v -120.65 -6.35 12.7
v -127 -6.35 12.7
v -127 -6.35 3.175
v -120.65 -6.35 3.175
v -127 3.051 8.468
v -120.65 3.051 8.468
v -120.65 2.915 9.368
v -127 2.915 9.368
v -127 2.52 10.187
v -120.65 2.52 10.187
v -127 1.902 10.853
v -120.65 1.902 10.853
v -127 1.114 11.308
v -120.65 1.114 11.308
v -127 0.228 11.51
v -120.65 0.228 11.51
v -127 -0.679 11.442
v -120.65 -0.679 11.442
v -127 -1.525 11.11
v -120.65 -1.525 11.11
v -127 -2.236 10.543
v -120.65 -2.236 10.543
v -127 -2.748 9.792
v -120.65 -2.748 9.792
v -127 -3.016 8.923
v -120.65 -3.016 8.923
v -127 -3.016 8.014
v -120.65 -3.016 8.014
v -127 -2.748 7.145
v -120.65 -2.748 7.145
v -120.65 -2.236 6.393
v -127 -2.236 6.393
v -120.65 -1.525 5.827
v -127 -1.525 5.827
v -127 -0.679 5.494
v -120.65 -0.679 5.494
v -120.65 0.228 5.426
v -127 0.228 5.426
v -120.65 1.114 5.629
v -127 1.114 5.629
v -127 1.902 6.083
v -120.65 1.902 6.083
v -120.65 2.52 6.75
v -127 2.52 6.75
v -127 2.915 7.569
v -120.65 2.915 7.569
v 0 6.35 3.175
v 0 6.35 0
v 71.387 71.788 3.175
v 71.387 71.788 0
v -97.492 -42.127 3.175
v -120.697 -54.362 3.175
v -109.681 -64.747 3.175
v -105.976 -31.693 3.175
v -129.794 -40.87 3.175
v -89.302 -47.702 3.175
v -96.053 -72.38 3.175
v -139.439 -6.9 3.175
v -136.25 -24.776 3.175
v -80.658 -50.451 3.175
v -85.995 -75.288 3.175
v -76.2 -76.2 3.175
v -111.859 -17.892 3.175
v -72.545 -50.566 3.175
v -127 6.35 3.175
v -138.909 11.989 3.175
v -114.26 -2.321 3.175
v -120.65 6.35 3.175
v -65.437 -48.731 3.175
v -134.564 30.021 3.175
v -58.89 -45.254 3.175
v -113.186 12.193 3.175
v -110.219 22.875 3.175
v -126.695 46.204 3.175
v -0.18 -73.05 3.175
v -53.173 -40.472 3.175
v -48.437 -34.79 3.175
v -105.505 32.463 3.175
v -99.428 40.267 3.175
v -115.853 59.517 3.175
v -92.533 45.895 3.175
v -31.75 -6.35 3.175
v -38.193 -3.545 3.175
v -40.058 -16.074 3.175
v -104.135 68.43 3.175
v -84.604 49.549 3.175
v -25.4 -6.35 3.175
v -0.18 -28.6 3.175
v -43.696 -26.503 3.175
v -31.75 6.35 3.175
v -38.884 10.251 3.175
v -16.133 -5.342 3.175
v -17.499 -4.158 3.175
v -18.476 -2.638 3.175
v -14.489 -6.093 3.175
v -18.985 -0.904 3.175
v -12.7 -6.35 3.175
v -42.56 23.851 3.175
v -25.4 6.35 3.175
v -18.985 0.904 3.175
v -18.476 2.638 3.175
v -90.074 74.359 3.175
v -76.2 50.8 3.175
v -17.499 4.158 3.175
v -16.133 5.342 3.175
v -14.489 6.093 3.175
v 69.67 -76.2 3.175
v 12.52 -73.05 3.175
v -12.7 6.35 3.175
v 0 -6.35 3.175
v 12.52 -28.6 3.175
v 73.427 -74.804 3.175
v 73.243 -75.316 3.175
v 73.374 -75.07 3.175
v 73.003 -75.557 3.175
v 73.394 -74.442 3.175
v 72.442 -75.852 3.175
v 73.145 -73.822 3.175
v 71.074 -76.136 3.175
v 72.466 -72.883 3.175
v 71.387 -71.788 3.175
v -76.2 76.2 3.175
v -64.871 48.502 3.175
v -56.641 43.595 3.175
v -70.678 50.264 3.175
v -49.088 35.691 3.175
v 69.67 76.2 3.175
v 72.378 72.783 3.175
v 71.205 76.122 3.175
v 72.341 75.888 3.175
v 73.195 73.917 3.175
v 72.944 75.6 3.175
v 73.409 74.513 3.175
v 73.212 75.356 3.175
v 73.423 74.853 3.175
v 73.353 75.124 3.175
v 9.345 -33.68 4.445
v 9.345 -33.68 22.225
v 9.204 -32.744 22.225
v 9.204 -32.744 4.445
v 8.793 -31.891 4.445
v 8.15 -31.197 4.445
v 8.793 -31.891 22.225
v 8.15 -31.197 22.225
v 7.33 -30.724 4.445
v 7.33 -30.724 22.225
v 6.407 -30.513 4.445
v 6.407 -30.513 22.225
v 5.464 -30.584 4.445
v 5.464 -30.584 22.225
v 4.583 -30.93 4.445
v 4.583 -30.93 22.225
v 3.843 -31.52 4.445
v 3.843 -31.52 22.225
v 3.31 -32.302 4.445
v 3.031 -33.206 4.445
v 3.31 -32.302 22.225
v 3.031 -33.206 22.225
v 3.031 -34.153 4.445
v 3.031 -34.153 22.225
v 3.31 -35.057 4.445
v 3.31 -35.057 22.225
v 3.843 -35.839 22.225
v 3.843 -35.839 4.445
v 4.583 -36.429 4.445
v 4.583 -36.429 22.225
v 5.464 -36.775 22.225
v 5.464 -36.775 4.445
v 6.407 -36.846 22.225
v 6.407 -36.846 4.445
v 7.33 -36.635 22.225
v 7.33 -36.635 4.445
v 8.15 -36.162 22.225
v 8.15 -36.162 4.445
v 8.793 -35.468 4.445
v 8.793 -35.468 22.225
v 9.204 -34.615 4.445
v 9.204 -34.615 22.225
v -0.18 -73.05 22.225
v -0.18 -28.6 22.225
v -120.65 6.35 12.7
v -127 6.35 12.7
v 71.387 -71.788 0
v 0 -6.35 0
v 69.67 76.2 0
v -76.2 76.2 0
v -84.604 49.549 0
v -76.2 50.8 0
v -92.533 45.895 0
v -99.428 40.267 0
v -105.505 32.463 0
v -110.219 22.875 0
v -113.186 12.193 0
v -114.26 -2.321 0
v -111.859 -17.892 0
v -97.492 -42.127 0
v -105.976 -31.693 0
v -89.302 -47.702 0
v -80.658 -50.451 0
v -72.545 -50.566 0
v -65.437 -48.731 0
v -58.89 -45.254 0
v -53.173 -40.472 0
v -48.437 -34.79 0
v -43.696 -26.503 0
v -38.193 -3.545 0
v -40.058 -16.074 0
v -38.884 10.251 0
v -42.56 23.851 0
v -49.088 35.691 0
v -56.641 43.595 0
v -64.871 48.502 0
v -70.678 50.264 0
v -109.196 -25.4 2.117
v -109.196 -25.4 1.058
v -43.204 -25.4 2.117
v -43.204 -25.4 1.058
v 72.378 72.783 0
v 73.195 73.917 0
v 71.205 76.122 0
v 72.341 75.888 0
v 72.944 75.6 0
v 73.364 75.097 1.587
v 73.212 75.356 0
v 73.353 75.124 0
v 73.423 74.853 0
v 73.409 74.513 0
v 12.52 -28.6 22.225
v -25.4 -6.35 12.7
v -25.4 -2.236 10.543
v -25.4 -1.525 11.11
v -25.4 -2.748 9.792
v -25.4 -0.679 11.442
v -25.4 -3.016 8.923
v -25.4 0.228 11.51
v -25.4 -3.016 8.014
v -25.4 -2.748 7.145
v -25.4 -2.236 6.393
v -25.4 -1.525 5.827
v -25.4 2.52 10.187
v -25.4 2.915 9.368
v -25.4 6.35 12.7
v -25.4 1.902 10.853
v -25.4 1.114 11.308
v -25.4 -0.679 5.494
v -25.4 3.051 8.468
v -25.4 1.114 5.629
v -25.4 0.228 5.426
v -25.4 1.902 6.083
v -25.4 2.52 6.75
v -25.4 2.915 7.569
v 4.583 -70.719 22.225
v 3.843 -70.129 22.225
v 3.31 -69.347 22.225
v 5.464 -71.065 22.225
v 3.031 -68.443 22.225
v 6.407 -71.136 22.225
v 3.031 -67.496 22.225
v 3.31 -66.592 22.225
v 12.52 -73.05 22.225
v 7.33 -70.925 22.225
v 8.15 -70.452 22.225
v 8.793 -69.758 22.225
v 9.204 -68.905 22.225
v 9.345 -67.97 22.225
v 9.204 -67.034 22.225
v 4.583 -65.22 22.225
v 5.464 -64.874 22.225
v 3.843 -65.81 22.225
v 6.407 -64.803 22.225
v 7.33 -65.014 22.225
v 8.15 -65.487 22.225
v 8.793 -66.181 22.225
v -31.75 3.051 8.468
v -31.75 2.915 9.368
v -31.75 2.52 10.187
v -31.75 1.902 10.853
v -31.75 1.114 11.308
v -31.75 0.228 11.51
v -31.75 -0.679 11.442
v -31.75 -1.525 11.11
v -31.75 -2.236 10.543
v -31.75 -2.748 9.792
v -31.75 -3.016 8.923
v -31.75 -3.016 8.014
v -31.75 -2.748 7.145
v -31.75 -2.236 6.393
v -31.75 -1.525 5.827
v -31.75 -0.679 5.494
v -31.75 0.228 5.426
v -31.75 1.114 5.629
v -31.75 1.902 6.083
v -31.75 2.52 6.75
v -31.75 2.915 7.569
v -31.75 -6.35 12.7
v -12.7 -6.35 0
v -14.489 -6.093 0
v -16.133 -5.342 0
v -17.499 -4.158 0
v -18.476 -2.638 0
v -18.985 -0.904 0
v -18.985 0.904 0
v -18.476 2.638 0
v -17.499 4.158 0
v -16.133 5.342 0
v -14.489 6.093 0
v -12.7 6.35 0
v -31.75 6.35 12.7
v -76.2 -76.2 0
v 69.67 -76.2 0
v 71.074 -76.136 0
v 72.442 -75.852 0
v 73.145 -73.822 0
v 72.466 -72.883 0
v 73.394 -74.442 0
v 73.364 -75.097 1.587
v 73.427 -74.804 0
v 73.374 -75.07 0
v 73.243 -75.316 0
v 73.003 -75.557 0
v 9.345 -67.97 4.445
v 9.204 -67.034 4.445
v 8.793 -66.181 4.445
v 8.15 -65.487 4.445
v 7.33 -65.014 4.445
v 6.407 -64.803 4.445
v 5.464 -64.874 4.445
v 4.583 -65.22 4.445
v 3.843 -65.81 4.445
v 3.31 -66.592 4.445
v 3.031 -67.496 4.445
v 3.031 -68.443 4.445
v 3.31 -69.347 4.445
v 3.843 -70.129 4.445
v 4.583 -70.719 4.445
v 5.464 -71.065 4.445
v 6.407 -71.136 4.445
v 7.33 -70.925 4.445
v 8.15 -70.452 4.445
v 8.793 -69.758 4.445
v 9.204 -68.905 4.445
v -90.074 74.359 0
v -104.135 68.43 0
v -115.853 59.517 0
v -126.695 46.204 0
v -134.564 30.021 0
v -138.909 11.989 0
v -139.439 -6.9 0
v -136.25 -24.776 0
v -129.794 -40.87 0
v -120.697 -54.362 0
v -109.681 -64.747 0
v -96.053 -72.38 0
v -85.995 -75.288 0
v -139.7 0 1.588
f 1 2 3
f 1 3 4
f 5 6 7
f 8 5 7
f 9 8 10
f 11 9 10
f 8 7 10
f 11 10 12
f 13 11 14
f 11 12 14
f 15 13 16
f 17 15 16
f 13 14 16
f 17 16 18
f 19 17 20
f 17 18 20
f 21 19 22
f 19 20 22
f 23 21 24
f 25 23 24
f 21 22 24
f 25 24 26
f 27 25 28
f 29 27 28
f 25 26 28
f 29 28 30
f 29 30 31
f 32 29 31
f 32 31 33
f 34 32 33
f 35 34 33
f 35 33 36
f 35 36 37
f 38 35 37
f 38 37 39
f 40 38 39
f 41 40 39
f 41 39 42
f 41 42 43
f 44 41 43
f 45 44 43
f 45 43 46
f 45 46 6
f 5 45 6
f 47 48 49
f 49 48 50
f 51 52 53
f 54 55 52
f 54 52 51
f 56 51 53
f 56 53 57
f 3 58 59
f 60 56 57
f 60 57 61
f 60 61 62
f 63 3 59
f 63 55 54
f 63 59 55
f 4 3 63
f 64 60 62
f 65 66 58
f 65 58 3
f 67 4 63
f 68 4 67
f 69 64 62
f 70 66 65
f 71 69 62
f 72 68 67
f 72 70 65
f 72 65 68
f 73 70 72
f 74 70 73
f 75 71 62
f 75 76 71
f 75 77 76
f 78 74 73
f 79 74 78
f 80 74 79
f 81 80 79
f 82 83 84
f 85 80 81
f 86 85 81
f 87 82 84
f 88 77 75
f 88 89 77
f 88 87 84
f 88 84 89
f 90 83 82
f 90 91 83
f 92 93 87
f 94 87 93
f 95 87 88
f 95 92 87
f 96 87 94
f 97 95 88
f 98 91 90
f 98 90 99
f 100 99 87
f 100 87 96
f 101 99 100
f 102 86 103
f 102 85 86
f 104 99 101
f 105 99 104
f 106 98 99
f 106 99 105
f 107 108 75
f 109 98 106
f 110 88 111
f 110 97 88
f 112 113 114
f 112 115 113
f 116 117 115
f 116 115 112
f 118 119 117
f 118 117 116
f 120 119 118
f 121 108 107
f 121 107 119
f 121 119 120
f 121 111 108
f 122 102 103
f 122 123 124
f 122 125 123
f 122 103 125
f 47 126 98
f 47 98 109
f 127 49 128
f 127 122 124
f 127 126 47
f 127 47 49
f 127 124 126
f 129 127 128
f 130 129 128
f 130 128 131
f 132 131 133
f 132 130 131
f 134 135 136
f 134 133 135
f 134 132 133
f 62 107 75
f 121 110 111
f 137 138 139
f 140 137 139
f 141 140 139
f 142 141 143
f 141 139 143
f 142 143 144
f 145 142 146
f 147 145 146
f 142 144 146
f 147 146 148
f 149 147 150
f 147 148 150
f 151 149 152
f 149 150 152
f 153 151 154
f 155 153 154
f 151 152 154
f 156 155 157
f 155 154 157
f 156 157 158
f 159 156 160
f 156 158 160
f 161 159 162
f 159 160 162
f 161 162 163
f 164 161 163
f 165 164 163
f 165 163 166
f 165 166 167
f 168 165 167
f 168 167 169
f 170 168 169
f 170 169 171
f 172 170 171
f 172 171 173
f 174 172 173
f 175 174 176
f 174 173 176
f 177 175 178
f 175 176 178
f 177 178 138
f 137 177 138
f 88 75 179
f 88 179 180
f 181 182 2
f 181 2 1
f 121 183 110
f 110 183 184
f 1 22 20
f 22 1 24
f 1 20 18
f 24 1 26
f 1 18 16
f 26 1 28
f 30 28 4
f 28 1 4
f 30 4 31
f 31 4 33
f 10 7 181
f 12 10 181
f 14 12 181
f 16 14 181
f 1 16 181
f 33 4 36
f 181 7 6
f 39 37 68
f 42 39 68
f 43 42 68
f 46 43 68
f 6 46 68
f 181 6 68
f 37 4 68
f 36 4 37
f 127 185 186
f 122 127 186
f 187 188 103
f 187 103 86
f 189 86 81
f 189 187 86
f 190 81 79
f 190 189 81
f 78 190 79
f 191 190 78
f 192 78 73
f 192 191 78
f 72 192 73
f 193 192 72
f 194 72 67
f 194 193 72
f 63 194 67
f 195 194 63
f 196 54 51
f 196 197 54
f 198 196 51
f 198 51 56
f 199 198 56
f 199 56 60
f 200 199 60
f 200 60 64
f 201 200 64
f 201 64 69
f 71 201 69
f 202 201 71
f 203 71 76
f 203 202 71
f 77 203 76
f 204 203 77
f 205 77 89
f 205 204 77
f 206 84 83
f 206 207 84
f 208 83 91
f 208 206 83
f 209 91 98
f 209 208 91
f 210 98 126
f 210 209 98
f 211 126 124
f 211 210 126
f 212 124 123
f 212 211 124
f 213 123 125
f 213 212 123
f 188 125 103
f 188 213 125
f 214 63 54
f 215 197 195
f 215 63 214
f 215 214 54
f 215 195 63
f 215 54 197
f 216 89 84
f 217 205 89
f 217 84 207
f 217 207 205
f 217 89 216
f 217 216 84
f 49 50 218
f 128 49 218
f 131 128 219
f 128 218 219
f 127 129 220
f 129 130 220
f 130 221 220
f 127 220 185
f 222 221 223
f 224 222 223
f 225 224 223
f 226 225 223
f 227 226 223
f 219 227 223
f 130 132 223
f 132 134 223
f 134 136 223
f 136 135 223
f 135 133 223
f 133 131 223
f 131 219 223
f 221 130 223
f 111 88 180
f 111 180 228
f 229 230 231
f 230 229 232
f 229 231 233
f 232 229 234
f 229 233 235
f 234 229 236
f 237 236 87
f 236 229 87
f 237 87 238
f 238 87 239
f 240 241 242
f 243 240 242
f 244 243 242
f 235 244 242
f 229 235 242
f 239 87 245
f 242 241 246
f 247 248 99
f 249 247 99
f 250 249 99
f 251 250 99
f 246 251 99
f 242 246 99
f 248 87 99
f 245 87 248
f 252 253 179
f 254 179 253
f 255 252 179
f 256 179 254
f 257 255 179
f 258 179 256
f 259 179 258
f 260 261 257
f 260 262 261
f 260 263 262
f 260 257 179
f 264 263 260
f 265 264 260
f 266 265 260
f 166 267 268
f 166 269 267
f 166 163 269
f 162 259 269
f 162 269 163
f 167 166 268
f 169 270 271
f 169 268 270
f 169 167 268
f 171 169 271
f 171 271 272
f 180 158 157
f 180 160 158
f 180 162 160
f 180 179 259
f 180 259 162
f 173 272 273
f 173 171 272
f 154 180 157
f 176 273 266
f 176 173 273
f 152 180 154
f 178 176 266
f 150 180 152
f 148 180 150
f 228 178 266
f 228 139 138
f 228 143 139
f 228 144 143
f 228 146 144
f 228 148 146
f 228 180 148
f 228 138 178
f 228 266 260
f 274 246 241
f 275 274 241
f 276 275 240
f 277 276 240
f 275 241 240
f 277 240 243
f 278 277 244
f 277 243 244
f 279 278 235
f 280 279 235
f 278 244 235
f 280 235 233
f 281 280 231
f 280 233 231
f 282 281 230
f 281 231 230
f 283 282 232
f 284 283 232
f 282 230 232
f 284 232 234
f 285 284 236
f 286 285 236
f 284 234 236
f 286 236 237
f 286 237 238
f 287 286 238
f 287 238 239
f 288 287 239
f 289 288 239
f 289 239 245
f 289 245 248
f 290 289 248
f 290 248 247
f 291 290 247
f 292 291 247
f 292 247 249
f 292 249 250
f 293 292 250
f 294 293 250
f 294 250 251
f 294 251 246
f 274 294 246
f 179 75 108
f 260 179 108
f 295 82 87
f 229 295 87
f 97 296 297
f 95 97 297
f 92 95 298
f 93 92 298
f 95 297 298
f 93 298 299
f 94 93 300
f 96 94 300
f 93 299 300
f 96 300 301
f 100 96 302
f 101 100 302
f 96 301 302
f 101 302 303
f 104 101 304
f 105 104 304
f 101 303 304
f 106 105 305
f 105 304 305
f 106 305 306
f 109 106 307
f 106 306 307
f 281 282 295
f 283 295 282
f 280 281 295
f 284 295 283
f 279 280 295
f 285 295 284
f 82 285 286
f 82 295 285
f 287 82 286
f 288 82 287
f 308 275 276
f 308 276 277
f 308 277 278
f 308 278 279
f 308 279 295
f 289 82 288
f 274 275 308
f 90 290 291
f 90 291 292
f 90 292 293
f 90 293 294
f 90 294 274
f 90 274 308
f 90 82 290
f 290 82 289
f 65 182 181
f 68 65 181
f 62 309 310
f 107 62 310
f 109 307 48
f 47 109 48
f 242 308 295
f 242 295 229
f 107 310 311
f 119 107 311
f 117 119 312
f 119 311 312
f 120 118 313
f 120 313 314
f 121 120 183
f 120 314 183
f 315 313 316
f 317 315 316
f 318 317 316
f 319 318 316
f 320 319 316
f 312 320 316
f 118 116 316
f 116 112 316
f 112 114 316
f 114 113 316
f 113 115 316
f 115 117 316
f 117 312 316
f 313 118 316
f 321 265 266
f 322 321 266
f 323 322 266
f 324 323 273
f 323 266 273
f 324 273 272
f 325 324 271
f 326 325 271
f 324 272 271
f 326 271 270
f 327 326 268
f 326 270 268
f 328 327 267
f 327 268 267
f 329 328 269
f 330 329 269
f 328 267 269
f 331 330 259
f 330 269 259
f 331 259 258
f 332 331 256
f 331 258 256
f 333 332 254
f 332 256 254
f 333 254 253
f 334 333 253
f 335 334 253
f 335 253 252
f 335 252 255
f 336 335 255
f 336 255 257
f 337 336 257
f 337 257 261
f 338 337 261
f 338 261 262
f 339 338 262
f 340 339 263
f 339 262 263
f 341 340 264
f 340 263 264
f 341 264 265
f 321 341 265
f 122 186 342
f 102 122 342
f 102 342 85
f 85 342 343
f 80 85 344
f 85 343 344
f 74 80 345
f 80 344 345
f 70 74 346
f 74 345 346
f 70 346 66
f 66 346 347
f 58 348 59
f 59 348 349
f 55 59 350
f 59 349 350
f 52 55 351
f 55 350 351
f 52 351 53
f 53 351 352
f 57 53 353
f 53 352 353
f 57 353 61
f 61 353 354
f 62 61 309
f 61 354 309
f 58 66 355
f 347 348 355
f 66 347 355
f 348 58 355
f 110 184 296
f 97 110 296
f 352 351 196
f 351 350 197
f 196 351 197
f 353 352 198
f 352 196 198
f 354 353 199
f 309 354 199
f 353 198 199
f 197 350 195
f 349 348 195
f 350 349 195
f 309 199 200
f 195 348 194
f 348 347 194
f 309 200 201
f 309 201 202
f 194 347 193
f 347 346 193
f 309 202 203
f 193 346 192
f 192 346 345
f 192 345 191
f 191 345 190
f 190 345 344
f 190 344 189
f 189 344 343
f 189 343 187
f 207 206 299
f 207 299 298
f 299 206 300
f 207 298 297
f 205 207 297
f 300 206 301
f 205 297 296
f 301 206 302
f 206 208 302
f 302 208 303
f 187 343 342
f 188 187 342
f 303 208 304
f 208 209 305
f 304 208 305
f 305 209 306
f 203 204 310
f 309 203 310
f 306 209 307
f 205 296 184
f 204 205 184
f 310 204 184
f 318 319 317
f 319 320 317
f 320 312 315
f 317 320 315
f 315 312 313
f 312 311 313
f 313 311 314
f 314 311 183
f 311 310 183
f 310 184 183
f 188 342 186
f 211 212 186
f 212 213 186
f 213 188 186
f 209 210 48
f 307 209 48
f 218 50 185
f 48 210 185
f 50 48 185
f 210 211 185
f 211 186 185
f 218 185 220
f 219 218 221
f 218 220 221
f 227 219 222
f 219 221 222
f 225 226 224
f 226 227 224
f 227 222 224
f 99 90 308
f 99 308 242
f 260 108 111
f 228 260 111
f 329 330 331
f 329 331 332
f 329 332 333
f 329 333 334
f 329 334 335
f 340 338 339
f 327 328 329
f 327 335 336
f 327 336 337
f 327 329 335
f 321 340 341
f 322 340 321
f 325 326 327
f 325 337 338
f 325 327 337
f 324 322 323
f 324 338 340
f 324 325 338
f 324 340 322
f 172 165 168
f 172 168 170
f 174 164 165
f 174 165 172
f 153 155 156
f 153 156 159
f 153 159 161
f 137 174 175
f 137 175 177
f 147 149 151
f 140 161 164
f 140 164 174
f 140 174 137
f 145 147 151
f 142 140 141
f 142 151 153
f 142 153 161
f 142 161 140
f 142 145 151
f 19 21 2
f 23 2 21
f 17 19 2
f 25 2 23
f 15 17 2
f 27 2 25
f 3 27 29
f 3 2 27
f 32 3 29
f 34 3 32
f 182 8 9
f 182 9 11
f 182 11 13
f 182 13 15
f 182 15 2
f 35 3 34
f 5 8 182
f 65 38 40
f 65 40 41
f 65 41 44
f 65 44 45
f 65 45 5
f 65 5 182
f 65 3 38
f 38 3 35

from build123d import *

# Parameters (mm, degrees)
F0_W        = 6.35
F0_H        = 12.7
F1_DEPTH    = 3.175
F3_T1_DEPTH = 35.8241837791
F4_DEPTH    = 12.7
F6_D        = 6.10108
F7_W        = 12.7
F7_H        = 44.45
F8_DEPTH    = 19.05
F9_R        = 3.175
F10_DEPTH   = 17.78
F11_DEPTH   = 17.78


# Not quite as in the source:
# - a fillet or chamfer that OpenCascade refuses, or shapes differently, is made with other operations: its cross-section is extruded or revolved along the edge and cut away or added
# - a feature of the source that left no trace in its solid (it failed there, or was rolled back) is left out


with BuildPart() as f1:
    # F0 (on Top) → F1 (new body)
    with BuildSketch(Plane.XY):
        with BuildLine():
            Line((76.2, 76.2), (-76.2, 76.2))
            add(Edge.make_bspline(
                [(-76.2, 76.2), (-139.7, 76.2), (-139.7, 0), (-139.7, -76.2), (-76.2, -76.2)],
                knots=[0, 0, 0, 1.5707963268, 1.5707963268, 3.1415926536, 3.1415926536, 3.1415926536], degree=2, weights=[1, 0.7071067812, 1, 0.7071067812, 1]))
            Line((-76.2, -76.2), (76.2, -76.2))
            Line((76.2, -76.2), (0, -6.35))
            Line((0, -6.35), (-12.7, -6.35))
            ThreePointArc((-12.7, -6.35), (-19.05, 0), (-12.7, 6.35))
            Line((-12.7, 6.35), (0, 6.35))
            Line((0, 6.35), (76.2, 76.2))
        make_face()
        with Locations((-123.825, 0)):
            Rectangle(F0_W, F0_H, mode=Mode.SUBTRACT)
        with BuildLine():
            add(Edge.make_bspline(
                [(-76.2, 50.8), (-142.1911357684, 50.8), (-109.1955678842, -25.4), (-76.2, -101.6), (-43.2044321158, -25.4), (-10.2088642316, 50.8), (-76.2, 50.8)],
                knots=[0, 0, 0, 2.0943951024, 2.0943951024, 4.1887902048, 4.1887902048, 6.2831853072, 6.2831853072, 6.2831853072], degree=2, weights=[1, 0.5, 1, 0.5, 1, 0.5, 1]))
        make_face(mode=Mode.SUBTRACT)
        with Locations((-28.575, 0)):
            Rectangle(F0_W, F0_H, mode=Mode.SUBTRACT)
    extrude(amount=F1_DEPTH)

    # F3: fillet of radius 2.54 on 2 edges, made by hand

    # F3_s2 → F3_t1 (cut)
    with BuildSketch(Plane.XY.offset(-16.3245918896)):
        with BuildLine():
            add(Edge.make_bspline(
                [(71.3865038006, 71.7876284839), (76.2, 76.2), (69.6701632442, 76.2)],
                knots=[0, 0, 0, 1, 1, 1], degree=2, weights=[1, 1, 1]))
            Line((69.6701632442, 76.2), (76.2, 76.2))
            Line((76.2, 76.2), (71.3865038006, 71.7876284839))
        make_face()
        with BuildLine():
            add(Edge.make_bspline(
                [(69.6701632442, -76.2), (76.2, -76.2), (71.3865038006, -71.7876284839)],
                knots=[0, 0, 0, 1, 1, 1], degree=2, weights=[1, 1, 1]))
            Line((71.3865038006, -71.7876284839), (76.2, -76.2))
            Line((76.2, -76.2), (69.6701632442, -76.2))
        make_face()
    extrude(amount=F3_T1_DEPTH, mode=Mode.SUBTRACT)

    # F0 (on Top) → F4 (join)
    with BuildSketch(Plane.XY):
        with Locations((-28.575, 0)):
            Rectangle(F0_W, F0_H)
        with Locations((-123.825, 0)):
            Rectangle(F0_W, F0_H)
    extrude(amount=F4_DEPTH)

    # F6 (through all)
    with Locations(Plane(origin=(-127, 0, 0), x_dir=(0, -1, 0), z_dir=(-1, 0, 0))):
        with Locations((0, 8.46836)):
            Hole(F6_D / 2)

    # F7 (on face) → F8 (join)
    with BuildSketch(Plane.XY.offset(3.175)):
        with Locations((6.1701632442, -50.8245005846)):
            Rectangle(F7_W, F7_H)
    extrude(amount=F8_DEPTH)

    # F9 (on face) → F10 (cut)
    with BuildSketch(Plane.XY.offset(22.225)):
        with Locations((6.1701632442, -67.9695005846)):
            Circle(F9_R)
    extrude(amount=-F10_DEPTH, mode=Mode.SUBTRACT)

    # F9 (on face) → F11 (cut)
    with BuildSketch(Plane.XY.offset(22.225)):
        with Locations((6.1701632442, -67.9695005846)):
            Circle(F9_R)
        with Locations((6.1701632442, -33.6795005846)):
            Circle(F9_R)
    extrude(amount=-F11_DEPTH, mode=Mode.SUBTRACT)


solid = f1.part
